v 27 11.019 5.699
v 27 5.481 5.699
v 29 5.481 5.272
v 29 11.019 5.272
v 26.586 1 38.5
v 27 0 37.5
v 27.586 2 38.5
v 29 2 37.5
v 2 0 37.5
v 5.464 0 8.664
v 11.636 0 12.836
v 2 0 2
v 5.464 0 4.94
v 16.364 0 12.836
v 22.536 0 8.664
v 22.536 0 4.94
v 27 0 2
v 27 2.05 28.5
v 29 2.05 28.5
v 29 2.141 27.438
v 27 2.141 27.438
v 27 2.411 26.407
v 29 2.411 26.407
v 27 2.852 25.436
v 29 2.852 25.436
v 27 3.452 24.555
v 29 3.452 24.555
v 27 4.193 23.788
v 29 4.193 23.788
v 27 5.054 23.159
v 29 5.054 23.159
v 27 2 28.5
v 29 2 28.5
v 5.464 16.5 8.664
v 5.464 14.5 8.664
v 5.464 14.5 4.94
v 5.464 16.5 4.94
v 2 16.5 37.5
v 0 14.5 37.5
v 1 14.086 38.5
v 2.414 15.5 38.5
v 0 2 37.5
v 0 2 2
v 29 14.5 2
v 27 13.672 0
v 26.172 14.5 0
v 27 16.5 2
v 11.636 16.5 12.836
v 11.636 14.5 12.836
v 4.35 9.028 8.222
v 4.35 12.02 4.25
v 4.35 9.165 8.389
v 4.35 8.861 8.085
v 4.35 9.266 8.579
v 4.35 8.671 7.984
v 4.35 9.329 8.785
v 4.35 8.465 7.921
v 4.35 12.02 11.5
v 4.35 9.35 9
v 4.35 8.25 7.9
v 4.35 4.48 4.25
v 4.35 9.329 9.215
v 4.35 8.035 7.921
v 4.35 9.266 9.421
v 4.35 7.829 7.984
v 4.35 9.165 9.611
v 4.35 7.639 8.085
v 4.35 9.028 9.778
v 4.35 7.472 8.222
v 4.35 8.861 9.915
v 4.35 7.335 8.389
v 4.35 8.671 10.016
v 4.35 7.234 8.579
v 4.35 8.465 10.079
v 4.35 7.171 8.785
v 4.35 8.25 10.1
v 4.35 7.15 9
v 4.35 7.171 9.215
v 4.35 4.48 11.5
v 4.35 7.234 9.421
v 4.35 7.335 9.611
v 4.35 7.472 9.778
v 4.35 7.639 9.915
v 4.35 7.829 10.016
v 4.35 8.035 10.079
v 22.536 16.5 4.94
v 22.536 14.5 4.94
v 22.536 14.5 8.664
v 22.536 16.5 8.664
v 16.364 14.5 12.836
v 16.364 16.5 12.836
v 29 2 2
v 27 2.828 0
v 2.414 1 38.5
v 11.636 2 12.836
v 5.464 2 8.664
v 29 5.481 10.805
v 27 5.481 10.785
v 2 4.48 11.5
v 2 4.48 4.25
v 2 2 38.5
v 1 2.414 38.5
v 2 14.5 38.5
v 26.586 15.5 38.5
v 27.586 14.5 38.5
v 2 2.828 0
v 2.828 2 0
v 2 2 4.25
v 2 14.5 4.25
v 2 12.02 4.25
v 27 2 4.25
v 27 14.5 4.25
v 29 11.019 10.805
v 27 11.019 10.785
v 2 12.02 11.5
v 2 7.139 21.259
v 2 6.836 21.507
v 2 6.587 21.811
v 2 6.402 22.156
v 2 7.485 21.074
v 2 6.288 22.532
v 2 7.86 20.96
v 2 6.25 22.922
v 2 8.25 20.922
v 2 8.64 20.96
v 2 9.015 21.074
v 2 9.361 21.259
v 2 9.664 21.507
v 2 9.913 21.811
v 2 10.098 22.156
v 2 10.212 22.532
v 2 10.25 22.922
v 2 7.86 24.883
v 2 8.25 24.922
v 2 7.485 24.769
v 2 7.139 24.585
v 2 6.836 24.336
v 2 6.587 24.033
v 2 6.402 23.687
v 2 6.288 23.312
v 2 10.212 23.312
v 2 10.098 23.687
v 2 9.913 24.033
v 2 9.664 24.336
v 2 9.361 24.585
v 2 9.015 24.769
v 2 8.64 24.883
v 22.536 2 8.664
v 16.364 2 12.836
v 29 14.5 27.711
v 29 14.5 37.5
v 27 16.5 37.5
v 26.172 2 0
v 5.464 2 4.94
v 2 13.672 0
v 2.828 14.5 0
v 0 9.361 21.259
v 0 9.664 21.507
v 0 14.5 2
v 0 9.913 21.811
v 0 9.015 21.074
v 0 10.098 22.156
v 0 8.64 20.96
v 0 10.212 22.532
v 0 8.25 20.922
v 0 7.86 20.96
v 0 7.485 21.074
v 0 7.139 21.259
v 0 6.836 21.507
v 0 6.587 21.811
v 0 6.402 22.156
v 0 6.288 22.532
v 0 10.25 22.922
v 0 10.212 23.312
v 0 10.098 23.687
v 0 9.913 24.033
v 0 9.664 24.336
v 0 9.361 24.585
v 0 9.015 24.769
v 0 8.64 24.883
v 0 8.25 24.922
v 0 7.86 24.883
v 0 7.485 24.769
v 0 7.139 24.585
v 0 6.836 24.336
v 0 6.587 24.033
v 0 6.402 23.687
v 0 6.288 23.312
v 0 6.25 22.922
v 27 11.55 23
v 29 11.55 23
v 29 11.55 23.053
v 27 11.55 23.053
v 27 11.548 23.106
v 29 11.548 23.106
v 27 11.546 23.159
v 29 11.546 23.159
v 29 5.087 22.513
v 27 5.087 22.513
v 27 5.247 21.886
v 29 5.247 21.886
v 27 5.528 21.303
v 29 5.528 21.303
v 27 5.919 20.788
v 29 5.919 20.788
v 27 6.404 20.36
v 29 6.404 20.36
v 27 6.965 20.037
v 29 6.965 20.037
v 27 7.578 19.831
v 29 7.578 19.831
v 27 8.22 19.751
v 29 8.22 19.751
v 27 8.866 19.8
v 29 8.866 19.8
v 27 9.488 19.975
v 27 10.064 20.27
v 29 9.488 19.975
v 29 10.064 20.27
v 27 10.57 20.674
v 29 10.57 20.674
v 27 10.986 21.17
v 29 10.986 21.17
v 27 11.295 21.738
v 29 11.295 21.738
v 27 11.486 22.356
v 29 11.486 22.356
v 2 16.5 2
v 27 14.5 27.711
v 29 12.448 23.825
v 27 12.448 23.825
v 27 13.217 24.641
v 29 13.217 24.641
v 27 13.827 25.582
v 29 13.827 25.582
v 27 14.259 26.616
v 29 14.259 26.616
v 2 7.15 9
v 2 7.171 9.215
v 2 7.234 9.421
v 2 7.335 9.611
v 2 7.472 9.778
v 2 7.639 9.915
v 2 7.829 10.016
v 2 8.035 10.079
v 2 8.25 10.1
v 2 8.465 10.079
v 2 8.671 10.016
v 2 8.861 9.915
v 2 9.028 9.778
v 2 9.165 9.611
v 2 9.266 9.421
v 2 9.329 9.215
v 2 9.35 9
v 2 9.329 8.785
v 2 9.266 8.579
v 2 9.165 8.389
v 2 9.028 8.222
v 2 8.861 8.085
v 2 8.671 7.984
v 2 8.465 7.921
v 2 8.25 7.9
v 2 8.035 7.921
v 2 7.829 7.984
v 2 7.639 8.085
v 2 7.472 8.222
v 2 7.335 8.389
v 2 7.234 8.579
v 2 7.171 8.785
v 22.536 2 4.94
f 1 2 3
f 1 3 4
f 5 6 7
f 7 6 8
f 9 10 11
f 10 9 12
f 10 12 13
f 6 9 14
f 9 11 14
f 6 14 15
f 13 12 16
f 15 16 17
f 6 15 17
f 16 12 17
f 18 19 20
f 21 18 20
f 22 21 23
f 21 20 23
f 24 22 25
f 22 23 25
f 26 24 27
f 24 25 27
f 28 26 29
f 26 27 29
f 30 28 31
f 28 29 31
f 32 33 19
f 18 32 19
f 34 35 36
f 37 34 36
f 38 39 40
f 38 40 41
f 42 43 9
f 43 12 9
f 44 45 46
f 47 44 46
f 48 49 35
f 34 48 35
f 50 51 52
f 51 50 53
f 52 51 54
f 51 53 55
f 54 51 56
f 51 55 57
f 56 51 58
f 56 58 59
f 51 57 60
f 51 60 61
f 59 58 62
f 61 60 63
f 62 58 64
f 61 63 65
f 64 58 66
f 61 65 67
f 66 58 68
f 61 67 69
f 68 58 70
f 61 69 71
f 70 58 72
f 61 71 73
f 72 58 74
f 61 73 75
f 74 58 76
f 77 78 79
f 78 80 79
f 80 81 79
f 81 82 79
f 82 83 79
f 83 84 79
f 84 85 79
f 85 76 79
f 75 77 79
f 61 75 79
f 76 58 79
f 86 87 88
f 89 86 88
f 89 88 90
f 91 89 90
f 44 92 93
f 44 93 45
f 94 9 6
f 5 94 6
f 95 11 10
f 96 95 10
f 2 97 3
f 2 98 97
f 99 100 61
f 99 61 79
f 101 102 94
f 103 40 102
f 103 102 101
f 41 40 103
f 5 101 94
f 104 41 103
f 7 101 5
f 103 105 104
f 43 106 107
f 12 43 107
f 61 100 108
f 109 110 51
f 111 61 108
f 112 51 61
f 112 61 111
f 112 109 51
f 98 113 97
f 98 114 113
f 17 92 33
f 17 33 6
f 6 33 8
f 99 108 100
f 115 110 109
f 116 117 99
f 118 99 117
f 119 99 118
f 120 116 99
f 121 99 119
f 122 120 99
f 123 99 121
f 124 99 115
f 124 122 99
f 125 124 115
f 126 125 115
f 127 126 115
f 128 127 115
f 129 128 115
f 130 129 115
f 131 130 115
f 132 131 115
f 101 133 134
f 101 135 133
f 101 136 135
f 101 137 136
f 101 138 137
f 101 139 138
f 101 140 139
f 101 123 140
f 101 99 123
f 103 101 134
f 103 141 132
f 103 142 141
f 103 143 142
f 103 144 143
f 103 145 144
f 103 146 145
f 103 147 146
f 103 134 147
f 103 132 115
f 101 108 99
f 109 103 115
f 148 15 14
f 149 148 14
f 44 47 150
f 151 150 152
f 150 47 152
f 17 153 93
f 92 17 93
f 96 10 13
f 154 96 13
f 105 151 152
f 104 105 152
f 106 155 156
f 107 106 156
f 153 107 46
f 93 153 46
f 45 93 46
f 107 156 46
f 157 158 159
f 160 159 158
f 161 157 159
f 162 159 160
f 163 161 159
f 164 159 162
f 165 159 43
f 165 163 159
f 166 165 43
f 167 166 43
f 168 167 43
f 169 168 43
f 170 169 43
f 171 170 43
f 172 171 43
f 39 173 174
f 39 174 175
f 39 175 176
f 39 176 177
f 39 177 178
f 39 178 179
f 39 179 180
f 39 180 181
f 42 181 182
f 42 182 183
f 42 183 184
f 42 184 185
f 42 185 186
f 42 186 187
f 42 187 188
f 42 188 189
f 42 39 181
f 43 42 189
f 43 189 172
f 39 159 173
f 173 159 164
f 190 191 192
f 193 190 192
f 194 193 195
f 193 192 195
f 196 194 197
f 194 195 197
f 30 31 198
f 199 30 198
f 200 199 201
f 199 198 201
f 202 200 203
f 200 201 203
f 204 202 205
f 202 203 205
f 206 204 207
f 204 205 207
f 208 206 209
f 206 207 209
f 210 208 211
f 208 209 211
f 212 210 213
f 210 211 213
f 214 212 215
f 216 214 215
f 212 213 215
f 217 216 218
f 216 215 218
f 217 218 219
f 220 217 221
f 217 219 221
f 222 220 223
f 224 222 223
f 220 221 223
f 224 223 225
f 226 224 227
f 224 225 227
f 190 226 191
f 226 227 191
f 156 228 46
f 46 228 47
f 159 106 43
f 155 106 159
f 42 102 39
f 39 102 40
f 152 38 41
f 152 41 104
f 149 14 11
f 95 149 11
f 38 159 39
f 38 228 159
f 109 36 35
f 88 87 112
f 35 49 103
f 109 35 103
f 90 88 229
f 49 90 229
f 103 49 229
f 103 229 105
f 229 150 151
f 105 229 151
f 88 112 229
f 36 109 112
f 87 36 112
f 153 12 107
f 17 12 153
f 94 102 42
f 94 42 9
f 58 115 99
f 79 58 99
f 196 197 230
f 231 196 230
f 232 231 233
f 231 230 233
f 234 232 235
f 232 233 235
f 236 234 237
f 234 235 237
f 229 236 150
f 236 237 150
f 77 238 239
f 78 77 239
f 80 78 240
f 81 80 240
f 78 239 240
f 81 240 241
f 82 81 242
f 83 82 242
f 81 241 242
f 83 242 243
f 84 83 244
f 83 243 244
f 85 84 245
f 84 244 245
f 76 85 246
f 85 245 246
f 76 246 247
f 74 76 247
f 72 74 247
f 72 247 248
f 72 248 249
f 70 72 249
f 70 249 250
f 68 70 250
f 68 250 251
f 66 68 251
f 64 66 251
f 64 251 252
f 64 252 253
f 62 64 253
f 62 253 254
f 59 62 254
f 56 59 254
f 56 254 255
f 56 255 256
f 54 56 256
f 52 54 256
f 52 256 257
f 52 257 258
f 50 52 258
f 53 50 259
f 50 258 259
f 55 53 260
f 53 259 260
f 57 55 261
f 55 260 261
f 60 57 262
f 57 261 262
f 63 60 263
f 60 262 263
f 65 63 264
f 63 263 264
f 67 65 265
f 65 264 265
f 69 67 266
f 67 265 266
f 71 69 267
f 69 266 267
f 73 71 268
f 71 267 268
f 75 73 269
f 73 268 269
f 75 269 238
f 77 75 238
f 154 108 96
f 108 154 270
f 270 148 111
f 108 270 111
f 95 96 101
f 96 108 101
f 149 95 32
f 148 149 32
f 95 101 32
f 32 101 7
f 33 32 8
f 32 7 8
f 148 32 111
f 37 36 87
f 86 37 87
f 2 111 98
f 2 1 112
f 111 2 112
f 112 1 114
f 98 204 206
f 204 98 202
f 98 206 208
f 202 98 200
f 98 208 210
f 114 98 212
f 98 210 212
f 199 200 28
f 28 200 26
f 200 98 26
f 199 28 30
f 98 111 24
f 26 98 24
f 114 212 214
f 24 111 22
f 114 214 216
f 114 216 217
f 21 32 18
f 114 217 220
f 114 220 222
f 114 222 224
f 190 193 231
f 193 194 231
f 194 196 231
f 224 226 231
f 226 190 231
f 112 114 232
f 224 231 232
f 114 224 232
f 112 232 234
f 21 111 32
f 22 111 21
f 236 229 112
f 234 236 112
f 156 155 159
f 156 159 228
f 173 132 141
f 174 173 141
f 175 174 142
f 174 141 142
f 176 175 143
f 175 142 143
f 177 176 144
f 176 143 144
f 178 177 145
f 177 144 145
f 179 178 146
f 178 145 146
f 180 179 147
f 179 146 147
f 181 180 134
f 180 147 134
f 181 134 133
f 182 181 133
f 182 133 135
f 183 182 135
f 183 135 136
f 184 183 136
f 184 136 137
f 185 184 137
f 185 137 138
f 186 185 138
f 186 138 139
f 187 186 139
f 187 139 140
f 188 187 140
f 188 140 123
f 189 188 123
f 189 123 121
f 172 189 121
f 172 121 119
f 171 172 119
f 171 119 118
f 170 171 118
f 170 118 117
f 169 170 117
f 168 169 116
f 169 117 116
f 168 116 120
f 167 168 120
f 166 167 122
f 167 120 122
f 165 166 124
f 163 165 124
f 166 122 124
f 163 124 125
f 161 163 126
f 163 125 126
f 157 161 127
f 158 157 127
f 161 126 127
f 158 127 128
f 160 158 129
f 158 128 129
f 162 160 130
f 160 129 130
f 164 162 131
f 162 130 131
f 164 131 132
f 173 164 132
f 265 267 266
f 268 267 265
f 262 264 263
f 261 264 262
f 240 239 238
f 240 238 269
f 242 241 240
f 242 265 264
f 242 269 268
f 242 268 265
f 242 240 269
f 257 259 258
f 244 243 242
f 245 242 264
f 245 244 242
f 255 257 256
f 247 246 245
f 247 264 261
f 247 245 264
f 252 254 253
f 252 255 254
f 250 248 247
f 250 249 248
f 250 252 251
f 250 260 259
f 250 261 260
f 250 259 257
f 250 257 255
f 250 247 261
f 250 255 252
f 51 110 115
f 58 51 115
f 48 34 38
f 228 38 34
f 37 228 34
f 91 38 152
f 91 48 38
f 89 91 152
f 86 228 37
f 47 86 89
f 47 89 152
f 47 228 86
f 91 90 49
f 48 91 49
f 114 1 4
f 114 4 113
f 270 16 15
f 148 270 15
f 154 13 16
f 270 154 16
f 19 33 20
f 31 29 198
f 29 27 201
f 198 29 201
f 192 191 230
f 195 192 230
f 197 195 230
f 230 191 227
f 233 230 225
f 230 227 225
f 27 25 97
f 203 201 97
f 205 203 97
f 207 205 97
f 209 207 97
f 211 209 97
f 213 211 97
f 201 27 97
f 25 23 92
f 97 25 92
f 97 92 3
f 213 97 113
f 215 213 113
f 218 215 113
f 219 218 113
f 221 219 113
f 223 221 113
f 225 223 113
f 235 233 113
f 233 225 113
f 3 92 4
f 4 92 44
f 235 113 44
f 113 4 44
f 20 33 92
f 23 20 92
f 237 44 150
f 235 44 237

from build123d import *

# Parameters (mm, degrees)
F0_W      = 29
F0_H      = 16.5
F1_DEPTH  = 38.5
F2_SIZE   = 2
F3_SIZE   = 2
F4_SIZE   = 1
F5_W      = 25
F5_H      = 12.5
F6_DEPTH  = 34.25
F8_DEPTH  = 16.501
F9_W      = 12.5
F9_H      = 1
F10_DEPTH = 25
F11_W     = 7.54
F11_H     = 7.25
F11_R     = 1.1
F12_DEPTH = 4.35
F13_R     = 2
F14_DEPTH = 25
F15_W     = 5.538
F15_H     = 5.533
F17_W     = 5.538
F17_H     = 4.538


with BuildPart() as f1:
    # F0 (on Top) → F1 (new body)
    with BuildSketch(Plane.XY):
        with Locations((14.5, 8.25)):
            Rectangle(F0_W, F0_H)
    extrude(amount=F1_DEPTH)

    # F2
    f2_edges = [f1.edges().sort_by_distance(p)[0] for p in [
        (0, 0, 19.25),
        (0, 16.5, 19.25),
        (29, 0, 19.25),
        (29, 16.5, 19.25),
    ]]
    chamfer(f2_edges, length=F2_SIZE)

    # F3
    f3_edges = [f1.edges().sort_by_distance(p)[0] for p in [
        (0, 8.25, 0),
        (1, 15.5, 0),
        (1, 1, 0),
        (14.5, 16.5, 0),
        (14.5, 0, 0),
        (28, 15.5, 0),
        (28, 1, 0),
        (29, 8.25, 0),
    ]]
    chamfer(f3_edges, length=F3_SIZE)

    # F4
    f4_edges = [f1.edges().sort_by_distance(p)[0] for p in [
        (0, 8.25, 38.5),
        (1, 15.5, 38.5),
        (1, 1, 38.5),
        (14.5, 16.5, 38.5),
        (14.5, 0, 38.5),
        (28, 15.5, 38.5),
        (28, 1, 38.5),
        (29, 8.25, 38.5),
    ]]
    chamfer(f4_edges, length=F4_SIZE)

    # F5 (on face) → F6 (cut)
    with BuildSketch(Plane.XY.offset(38.5)):
        with Locations((14.5, 8.25)):
            Rectangle(F5_W, F5_H)
    extrude(amount=-F6_DEPTH, mode=Mode.SUBTRACT)

    # F7 (on face) → F8 (cut, through all)
    with BuildSketch(Plane.XZ):
        Polygon((5.464, 8.664), (5.464, 4.94), (22.536, 4.94), (22.536, 8.664), (16.364, 12.836), (11.636, 12.836), align=None)
    extrude(amount=-F8_DEPTH, mode=Mode.SUBTRACT)

    # F9 (on face) → F10 (cut)
    with BuildSketch(Plane.YZ.offset(29)):
        with BuildLine():
            ThreePointArc((5.0538961688, 23.1590909091), (8.2204306945, 19.7509741882), (11.55, 23))
            ThreePointArc((11.55, 23), (11.5490258118, 23.0795693055), (11.5461038312, 23.1590909091))
            ThreePointArc((11.5461038312, 23.1590909091), (8.3, 22.25), (5.0538961688, 23.1590909091))
        make_face()
        with BuildLine():
            ThreePointArc((5.0538961688, 23.1590909091), (8.3, 22.25), (11.5461038312, 23.1590909091))
            ThreePointArc((11.5461038312, 23.1590909091), (8.3, 26.25), (5.0538961688, 23.1590909091))
        make_face()
        with BuildLine():
            ThreePointArc((5.0538961688, 23.1590909091), (8.3, 26.25), (11.5461038312, 23.1590909091))
            ThreePointArc((11.5461038312, 23.1590909091), (13.5428254576, 25.0977535038), (14.5, 27.7110133081))
            Line((14.5, 27.7110133081), (14.5, 28.5))
            Line((14.5, 28.5), (2.05, 28.5))
            ThreePointArc((2.05, 28.5), (2.8524937382, 25.4361502113), (5.0538961688, 23.1590909091))
        make_face()
        with BuildLine():
            Line((2, 28.5), (2.05, 28.5))
            ThreePointArc((2.05, 28.5), (7.9047152925, 34.7374874749), (14.5, 29.2889866919))
            Line((14.5, 29.2889866919), (14.5, 37.5))
            Line((14.5, 37.5), (2, 37.5))
            Line((2, 37.5), (2, 28.5))
        make_face()
        with BuildLine():
            ThreePointArc((14.5, 29.2889866919), (7.9047152925, 34.7374874749), (2.05, 28.5))
            Line((2.05, 28.5), (14.5, 28.5))
            Line((14.5, 28.5), (14.5, 29.2889866919))
        make_face()
        with Locations((8.25, 38)):
            Rectangle(F9_W, F9_H)
    extrude(amount=-F10_DEPTH, mode=Mode.SUBTRACT)

    # F11 (on face) → F12 (join)
    with BuildSketch(Plane(origin=(0, 0, 0), x_dir=(0, -1, 0), z_dir=(-1, 0, 0))):
        with Locations((-8.25, 7.875)):
            Rectangle(F11_W, F11_H)
        with Locations((-8.25, 9)):
            Circle(F11_R, mode=Mode.SUBTRACT)
    extrude(amount=-F12_DEPTH)

    # F13 (on face) → F14 (cut)
    with BuildSketch(Plane.YZ.offset(2)):
        with Locations((8.25, 22.9216944426)):
            Circle(F13_R)
    extrude(amount=-F14_DEPTH, mode=Mode.SUBTRACT)

    # F15 (on face) → F18 section 0
    with BuildSketch(Plane.YZ.offset(29)):
        with Locations((8.25, 8.0385)):
            Rectangle(F15_W, F15_H)
    # F17 (on offset) → F18 section 1
    with BuildSketch(Plane.YZ.offset(24.55)):
        with Locations((8.25, 8.491)):
            Rectangle(F17_W, F17_H)
    loft(mode=Mode.SUBTRACT)


solid = f1.part
